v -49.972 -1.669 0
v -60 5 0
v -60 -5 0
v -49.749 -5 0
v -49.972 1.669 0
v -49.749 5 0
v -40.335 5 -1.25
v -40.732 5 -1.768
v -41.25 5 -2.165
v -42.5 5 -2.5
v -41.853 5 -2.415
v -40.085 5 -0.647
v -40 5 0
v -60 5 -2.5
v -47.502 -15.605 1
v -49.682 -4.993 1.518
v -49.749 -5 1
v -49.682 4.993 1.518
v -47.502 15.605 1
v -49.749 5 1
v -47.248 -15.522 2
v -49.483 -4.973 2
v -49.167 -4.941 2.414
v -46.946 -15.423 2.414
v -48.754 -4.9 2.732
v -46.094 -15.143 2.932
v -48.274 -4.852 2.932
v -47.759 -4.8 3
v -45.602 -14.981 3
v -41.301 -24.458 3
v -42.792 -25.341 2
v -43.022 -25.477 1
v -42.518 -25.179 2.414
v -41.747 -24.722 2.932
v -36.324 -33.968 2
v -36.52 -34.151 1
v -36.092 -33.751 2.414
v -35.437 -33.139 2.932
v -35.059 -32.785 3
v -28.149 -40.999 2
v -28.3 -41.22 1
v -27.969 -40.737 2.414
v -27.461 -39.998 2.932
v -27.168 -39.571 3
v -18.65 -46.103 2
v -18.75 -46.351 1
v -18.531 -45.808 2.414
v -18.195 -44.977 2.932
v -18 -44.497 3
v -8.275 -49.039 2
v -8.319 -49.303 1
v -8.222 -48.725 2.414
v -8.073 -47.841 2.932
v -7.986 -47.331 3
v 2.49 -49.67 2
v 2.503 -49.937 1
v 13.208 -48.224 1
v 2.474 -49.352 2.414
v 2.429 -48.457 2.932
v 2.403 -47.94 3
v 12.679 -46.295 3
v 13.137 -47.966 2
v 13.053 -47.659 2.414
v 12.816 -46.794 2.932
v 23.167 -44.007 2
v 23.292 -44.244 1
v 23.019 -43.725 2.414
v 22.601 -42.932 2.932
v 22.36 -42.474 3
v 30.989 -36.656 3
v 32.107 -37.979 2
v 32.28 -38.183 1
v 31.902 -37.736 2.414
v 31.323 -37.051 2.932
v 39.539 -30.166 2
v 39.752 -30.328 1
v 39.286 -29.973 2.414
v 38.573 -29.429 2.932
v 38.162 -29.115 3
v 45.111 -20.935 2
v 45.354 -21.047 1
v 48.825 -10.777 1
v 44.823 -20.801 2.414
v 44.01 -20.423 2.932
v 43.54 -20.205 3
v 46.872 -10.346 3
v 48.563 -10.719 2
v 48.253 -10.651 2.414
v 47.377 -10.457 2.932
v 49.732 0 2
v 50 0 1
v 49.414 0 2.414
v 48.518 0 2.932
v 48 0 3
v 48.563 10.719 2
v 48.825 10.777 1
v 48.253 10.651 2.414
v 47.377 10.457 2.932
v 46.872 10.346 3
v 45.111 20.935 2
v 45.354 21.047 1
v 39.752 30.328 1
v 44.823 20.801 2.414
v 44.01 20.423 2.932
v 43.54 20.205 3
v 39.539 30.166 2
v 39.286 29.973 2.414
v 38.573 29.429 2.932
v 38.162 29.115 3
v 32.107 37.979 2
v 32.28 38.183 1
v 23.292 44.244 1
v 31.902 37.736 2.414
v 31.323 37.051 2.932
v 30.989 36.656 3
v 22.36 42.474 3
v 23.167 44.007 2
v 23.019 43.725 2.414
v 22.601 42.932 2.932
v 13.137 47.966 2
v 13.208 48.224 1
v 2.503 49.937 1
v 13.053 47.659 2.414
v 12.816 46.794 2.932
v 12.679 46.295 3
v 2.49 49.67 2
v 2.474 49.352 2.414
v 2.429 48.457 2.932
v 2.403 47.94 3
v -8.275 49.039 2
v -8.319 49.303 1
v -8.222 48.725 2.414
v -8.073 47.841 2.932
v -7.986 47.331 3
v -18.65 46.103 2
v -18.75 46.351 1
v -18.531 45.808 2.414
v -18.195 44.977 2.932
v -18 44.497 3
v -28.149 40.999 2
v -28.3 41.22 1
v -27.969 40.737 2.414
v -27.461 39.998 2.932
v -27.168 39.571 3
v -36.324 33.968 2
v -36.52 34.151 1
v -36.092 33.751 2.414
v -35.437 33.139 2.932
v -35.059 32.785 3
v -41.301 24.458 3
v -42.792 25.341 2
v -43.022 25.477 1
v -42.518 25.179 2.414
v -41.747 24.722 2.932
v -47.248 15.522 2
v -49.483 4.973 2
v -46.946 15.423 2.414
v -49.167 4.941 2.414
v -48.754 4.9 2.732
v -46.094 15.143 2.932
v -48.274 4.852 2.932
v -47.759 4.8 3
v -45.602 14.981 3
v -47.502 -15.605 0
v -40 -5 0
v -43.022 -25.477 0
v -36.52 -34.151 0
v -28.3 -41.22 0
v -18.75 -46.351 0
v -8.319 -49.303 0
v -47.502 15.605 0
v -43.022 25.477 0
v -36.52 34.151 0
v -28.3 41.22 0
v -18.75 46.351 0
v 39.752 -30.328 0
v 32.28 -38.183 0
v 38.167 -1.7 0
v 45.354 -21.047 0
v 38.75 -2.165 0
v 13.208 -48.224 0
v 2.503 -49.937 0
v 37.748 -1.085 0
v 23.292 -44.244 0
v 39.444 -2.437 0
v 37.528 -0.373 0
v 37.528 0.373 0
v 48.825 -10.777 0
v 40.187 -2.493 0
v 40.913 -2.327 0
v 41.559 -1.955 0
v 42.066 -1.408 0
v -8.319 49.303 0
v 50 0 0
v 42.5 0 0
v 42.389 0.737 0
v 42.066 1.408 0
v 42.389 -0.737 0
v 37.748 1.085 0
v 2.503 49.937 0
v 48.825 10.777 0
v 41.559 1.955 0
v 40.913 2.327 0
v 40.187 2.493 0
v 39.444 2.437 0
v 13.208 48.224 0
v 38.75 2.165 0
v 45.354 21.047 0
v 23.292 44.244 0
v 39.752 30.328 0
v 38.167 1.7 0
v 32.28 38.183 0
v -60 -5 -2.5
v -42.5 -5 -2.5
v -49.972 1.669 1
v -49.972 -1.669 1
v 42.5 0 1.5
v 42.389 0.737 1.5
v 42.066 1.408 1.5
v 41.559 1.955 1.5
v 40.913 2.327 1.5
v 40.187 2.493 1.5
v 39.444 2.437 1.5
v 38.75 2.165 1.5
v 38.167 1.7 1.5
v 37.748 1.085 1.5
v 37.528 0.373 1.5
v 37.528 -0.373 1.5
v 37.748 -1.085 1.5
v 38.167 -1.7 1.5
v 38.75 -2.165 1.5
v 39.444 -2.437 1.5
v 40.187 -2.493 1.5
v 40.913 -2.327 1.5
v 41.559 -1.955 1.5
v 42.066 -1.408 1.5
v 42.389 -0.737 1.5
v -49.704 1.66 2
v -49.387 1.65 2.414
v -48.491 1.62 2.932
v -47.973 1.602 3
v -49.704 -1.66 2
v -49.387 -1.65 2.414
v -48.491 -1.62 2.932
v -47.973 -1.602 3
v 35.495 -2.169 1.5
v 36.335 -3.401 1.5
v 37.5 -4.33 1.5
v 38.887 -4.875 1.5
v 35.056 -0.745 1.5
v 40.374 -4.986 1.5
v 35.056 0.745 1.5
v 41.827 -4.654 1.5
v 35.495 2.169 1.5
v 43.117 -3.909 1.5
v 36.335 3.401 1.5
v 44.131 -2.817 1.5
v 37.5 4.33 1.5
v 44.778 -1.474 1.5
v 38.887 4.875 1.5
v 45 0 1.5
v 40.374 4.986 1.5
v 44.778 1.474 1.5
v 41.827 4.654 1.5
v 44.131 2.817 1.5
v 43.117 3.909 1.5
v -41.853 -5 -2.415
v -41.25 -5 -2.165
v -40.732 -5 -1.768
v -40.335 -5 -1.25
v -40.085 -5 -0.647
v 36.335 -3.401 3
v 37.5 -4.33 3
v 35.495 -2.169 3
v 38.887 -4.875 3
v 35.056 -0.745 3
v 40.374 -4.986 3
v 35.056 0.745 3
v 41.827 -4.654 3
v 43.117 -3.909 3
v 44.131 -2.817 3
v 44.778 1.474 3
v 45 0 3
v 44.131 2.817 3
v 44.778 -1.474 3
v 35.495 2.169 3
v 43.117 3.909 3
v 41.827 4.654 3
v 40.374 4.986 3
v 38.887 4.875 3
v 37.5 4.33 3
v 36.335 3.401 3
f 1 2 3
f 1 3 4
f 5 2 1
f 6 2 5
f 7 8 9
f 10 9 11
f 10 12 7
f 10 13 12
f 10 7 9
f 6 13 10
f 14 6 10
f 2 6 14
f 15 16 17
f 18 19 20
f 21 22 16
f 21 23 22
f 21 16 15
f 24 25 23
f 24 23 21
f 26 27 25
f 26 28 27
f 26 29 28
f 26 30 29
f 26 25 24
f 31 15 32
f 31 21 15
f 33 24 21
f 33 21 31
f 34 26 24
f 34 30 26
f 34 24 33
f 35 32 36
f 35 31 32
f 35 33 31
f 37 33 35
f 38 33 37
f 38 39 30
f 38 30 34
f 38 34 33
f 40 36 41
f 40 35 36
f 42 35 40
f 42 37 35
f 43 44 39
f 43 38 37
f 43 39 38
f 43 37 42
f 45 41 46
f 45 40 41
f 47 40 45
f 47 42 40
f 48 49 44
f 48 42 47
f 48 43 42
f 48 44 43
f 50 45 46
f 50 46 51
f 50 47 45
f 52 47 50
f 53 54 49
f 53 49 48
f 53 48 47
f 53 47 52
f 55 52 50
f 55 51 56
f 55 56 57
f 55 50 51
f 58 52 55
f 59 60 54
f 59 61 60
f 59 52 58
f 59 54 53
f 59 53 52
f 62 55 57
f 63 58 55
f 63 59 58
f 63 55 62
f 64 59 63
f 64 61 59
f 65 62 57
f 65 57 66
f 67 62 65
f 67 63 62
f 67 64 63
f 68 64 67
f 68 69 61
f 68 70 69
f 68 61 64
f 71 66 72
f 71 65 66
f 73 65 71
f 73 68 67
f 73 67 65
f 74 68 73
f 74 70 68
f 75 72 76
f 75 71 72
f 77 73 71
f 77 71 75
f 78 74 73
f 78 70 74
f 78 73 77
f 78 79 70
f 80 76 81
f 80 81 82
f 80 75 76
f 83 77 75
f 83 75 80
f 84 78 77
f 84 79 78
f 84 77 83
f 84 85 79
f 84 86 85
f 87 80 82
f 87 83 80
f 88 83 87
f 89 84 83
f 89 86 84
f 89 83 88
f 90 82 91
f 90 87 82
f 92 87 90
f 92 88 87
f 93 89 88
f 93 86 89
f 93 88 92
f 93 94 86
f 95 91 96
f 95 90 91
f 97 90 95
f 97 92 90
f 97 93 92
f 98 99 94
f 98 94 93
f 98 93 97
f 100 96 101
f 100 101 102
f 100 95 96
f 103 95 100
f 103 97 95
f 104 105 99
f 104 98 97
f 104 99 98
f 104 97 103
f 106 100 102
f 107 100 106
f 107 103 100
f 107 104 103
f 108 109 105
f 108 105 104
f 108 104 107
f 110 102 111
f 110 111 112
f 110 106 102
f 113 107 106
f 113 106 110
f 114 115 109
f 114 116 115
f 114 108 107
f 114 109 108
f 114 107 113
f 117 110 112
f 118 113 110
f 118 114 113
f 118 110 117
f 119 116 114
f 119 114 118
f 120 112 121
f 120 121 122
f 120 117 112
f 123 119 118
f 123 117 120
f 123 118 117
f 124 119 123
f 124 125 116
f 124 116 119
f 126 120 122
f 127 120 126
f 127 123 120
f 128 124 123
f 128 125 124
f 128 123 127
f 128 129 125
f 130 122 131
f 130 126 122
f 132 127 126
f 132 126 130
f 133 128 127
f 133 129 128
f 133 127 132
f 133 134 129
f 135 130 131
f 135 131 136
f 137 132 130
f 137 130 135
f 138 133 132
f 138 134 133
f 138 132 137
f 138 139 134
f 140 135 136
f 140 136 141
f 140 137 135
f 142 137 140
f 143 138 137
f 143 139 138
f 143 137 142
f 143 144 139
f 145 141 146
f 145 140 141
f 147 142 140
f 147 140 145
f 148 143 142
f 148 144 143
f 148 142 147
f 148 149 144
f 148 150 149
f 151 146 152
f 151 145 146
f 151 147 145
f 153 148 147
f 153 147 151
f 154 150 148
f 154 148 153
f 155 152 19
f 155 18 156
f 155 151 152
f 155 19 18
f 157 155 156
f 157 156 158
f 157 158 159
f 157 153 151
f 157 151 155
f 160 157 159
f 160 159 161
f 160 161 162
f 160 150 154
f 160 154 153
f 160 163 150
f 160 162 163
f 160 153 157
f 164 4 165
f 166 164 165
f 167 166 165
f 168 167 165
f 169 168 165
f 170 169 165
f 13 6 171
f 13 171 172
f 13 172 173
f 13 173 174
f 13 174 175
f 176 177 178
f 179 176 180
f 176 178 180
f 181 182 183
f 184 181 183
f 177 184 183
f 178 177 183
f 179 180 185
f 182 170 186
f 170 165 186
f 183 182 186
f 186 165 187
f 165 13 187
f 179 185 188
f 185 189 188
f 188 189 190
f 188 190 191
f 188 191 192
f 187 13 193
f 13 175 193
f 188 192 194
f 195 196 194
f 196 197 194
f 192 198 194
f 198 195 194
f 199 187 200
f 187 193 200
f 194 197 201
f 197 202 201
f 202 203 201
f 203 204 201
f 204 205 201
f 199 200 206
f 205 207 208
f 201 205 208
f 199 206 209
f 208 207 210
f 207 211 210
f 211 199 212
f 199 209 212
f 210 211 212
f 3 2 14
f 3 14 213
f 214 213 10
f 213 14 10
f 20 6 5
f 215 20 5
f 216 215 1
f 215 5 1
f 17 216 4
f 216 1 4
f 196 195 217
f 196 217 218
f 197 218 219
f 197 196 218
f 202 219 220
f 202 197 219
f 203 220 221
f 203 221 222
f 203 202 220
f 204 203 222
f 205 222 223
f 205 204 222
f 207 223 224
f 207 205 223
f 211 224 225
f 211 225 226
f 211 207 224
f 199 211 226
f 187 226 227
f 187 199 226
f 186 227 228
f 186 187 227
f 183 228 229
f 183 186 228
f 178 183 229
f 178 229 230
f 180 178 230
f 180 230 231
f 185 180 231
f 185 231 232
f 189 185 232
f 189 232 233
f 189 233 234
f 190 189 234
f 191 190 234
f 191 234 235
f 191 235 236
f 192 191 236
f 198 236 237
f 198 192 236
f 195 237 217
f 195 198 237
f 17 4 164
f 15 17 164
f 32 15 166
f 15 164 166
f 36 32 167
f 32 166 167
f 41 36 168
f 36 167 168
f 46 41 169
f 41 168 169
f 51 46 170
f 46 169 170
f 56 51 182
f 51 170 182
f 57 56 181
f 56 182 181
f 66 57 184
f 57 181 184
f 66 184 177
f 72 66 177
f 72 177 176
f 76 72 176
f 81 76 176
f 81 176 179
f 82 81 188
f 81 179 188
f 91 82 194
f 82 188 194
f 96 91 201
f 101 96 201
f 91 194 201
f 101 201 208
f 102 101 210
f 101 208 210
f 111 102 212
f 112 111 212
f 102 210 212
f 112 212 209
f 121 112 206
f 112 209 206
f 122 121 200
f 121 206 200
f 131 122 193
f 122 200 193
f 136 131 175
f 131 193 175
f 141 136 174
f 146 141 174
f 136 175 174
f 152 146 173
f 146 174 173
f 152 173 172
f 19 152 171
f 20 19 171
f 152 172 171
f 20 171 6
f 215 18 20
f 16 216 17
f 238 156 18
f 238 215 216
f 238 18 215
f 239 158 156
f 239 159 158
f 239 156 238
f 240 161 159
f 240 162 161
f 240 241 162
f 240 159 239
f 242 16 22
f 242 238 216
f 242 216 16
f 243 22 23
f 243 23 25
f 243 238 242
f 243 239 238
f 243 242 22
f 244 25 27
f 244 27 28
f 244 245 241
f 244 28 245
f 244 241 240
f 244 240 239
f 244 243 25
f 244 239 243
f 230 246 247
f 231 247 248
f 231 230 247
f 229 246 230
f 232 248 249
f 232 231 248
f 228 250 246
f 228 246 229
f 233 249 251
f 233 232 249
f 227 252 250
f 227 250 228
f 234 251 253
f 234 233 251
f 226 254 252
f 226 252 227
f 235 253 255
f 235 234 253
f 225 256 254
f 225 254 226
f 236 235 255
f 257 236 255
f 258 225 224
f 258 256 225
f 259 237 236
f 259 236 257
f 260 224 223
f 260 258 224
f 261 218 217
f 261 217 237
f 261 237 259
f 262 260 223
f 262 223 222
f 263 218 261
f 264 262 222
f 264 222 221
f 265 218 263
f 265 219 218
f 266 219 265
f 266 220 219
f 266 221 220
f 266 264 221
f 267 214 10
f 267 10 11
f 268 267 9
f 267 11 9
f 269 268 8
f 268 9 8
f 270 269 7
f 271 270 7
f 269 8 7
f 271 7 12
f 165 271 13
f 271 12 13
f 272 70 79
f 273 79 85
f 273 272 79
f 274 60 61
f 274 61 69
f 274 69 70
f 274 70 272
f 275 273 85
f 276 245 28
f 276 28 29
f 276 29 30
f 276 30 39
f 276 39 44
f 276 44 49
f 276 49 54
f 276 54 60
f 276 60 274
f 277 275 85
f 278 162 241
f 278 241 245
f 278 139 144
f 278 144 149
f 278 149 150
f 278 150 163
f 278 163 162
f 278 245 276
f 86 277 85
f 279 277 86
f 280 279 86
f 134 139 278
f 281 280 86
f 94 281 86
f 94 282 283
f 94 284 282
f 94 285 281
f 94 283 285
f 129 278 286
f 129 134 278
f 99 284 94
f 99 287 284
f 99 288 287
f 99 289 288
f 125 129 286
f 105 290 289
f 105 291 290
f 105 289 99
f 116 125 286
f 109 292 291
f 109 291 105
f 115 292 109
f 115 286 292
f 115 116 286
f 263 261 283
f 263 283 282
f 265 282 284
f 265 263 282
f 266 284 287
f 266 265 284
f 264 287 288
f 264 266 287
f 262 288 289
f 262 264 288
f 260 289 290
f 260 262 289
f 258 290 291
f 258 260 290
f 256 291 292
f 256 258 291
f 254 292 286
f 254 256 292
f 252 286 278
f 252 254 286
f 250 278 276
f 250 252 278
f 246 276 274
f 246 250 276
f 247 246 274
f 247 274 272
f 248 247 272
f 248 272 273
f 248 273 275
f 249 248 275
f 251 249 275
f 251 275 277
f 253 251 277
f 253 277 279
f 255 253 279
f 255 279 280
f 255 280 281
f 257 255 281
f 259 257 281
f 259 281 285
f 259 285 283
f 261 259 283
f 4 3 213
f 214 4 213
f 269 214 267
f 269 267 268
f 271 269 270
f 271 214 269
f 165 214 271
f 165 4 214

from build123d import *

# Parameters (mm, degrees)
F0_R     = 5
F1_DEPTH = 3
F0_R_2   = 2.5
F2_DEPTH = 1.5
F3_DEPTH = 2.5
F4_R     = 2.49999
F5_R     = 2


# Not quite as in the source:
# - a fillet or chamfer is up to 0.001 mm smaller than in the source, because OpenCascade refuses the exact size


with BuildPart() as f1:
    # F0 (on Top) → F1 (new body)
    with BuildSketch(Plane.XY):
        with BuildLine():
            ThreePointArc((-49.7493718553, -5), (2.503138753, -49.9373036555), (50, 0))
            ThreePointArc((50, 0), (2.503138753, 49.9373036555), (-49.7493718553, 5))
            Line((-49.7493718553, 5), (-40, 5))
            Line((-40, 5), (-40, -5))
            Line((-40, -5), (-49.7493718553, -5))
        make_face()
        with Locations((40, 0)):
            Circle(F0_R, mode=Mode.SUBTRACT)
        with BuildLine():
            Line((-40, 5), (-49.7493718553, 5))
            ThreePointArc((-49.7493718553, 5), (-50, 0), (-49.7493718553, -5))
            Line((-49.7493718553, -5), (-40, -5))
            Line((-40, -5), (-40, 5))
        make_face()
    extrude(amount=F1_DEPTH)

    # F0 (on Top) → F2 (join)
    with BuildSketch(Plane.XY):
        with Locations((40, 0)):
            Circle(F0_R)
        with Locations((40, 0)):
            Circle(F0_R_2, mode=Mode.SUBTRACT)
    extrude(amount=F2_DEPTH)

    # F0 (on Top) → F3 (join)
    with BuildSketch(Plane.XY):
        with BuildLine():
            ThreePointArc((-49.7493718553, -5), (-50, 0), (-49.7493718553, 5))
            Line((-49.7493718553, 5), (-60, 5))
            Line((-60, 5), (-60, -5))
            Line((-60, -5), (-49.7493718553, -5))
        make_face()
        with BuildLine():
            Line((-40, 5), (-49.7493718553, 5))
            ThreePointArc((-49.7493718553, 5), (-50, 0), (-49.7493718553, -5))
            Line((-49.7493718553, -5), (-40, -5))
            Line((-40, -5), (-40, 5))
        make_face()
    extrude(amount=-F3_DEPTH)

    # F4 (radius 2.5 in the source; OpenCascade refuses exactly that, so slightly less here)
    f4_edges = [f1.edges().sort_by_distance(p)[0] for p in [
        (-40, 0, -2.5),
    ]]
    fillet(f4_edges, radius=F4_R)

    # F5
    f5_edges = [f1.edges().sort_by_distance(p)[0] for p in [
        (-50, 0, 3),
    ]]
    fillet(f5_edges, radius=F5_R)


solid = f1.part
